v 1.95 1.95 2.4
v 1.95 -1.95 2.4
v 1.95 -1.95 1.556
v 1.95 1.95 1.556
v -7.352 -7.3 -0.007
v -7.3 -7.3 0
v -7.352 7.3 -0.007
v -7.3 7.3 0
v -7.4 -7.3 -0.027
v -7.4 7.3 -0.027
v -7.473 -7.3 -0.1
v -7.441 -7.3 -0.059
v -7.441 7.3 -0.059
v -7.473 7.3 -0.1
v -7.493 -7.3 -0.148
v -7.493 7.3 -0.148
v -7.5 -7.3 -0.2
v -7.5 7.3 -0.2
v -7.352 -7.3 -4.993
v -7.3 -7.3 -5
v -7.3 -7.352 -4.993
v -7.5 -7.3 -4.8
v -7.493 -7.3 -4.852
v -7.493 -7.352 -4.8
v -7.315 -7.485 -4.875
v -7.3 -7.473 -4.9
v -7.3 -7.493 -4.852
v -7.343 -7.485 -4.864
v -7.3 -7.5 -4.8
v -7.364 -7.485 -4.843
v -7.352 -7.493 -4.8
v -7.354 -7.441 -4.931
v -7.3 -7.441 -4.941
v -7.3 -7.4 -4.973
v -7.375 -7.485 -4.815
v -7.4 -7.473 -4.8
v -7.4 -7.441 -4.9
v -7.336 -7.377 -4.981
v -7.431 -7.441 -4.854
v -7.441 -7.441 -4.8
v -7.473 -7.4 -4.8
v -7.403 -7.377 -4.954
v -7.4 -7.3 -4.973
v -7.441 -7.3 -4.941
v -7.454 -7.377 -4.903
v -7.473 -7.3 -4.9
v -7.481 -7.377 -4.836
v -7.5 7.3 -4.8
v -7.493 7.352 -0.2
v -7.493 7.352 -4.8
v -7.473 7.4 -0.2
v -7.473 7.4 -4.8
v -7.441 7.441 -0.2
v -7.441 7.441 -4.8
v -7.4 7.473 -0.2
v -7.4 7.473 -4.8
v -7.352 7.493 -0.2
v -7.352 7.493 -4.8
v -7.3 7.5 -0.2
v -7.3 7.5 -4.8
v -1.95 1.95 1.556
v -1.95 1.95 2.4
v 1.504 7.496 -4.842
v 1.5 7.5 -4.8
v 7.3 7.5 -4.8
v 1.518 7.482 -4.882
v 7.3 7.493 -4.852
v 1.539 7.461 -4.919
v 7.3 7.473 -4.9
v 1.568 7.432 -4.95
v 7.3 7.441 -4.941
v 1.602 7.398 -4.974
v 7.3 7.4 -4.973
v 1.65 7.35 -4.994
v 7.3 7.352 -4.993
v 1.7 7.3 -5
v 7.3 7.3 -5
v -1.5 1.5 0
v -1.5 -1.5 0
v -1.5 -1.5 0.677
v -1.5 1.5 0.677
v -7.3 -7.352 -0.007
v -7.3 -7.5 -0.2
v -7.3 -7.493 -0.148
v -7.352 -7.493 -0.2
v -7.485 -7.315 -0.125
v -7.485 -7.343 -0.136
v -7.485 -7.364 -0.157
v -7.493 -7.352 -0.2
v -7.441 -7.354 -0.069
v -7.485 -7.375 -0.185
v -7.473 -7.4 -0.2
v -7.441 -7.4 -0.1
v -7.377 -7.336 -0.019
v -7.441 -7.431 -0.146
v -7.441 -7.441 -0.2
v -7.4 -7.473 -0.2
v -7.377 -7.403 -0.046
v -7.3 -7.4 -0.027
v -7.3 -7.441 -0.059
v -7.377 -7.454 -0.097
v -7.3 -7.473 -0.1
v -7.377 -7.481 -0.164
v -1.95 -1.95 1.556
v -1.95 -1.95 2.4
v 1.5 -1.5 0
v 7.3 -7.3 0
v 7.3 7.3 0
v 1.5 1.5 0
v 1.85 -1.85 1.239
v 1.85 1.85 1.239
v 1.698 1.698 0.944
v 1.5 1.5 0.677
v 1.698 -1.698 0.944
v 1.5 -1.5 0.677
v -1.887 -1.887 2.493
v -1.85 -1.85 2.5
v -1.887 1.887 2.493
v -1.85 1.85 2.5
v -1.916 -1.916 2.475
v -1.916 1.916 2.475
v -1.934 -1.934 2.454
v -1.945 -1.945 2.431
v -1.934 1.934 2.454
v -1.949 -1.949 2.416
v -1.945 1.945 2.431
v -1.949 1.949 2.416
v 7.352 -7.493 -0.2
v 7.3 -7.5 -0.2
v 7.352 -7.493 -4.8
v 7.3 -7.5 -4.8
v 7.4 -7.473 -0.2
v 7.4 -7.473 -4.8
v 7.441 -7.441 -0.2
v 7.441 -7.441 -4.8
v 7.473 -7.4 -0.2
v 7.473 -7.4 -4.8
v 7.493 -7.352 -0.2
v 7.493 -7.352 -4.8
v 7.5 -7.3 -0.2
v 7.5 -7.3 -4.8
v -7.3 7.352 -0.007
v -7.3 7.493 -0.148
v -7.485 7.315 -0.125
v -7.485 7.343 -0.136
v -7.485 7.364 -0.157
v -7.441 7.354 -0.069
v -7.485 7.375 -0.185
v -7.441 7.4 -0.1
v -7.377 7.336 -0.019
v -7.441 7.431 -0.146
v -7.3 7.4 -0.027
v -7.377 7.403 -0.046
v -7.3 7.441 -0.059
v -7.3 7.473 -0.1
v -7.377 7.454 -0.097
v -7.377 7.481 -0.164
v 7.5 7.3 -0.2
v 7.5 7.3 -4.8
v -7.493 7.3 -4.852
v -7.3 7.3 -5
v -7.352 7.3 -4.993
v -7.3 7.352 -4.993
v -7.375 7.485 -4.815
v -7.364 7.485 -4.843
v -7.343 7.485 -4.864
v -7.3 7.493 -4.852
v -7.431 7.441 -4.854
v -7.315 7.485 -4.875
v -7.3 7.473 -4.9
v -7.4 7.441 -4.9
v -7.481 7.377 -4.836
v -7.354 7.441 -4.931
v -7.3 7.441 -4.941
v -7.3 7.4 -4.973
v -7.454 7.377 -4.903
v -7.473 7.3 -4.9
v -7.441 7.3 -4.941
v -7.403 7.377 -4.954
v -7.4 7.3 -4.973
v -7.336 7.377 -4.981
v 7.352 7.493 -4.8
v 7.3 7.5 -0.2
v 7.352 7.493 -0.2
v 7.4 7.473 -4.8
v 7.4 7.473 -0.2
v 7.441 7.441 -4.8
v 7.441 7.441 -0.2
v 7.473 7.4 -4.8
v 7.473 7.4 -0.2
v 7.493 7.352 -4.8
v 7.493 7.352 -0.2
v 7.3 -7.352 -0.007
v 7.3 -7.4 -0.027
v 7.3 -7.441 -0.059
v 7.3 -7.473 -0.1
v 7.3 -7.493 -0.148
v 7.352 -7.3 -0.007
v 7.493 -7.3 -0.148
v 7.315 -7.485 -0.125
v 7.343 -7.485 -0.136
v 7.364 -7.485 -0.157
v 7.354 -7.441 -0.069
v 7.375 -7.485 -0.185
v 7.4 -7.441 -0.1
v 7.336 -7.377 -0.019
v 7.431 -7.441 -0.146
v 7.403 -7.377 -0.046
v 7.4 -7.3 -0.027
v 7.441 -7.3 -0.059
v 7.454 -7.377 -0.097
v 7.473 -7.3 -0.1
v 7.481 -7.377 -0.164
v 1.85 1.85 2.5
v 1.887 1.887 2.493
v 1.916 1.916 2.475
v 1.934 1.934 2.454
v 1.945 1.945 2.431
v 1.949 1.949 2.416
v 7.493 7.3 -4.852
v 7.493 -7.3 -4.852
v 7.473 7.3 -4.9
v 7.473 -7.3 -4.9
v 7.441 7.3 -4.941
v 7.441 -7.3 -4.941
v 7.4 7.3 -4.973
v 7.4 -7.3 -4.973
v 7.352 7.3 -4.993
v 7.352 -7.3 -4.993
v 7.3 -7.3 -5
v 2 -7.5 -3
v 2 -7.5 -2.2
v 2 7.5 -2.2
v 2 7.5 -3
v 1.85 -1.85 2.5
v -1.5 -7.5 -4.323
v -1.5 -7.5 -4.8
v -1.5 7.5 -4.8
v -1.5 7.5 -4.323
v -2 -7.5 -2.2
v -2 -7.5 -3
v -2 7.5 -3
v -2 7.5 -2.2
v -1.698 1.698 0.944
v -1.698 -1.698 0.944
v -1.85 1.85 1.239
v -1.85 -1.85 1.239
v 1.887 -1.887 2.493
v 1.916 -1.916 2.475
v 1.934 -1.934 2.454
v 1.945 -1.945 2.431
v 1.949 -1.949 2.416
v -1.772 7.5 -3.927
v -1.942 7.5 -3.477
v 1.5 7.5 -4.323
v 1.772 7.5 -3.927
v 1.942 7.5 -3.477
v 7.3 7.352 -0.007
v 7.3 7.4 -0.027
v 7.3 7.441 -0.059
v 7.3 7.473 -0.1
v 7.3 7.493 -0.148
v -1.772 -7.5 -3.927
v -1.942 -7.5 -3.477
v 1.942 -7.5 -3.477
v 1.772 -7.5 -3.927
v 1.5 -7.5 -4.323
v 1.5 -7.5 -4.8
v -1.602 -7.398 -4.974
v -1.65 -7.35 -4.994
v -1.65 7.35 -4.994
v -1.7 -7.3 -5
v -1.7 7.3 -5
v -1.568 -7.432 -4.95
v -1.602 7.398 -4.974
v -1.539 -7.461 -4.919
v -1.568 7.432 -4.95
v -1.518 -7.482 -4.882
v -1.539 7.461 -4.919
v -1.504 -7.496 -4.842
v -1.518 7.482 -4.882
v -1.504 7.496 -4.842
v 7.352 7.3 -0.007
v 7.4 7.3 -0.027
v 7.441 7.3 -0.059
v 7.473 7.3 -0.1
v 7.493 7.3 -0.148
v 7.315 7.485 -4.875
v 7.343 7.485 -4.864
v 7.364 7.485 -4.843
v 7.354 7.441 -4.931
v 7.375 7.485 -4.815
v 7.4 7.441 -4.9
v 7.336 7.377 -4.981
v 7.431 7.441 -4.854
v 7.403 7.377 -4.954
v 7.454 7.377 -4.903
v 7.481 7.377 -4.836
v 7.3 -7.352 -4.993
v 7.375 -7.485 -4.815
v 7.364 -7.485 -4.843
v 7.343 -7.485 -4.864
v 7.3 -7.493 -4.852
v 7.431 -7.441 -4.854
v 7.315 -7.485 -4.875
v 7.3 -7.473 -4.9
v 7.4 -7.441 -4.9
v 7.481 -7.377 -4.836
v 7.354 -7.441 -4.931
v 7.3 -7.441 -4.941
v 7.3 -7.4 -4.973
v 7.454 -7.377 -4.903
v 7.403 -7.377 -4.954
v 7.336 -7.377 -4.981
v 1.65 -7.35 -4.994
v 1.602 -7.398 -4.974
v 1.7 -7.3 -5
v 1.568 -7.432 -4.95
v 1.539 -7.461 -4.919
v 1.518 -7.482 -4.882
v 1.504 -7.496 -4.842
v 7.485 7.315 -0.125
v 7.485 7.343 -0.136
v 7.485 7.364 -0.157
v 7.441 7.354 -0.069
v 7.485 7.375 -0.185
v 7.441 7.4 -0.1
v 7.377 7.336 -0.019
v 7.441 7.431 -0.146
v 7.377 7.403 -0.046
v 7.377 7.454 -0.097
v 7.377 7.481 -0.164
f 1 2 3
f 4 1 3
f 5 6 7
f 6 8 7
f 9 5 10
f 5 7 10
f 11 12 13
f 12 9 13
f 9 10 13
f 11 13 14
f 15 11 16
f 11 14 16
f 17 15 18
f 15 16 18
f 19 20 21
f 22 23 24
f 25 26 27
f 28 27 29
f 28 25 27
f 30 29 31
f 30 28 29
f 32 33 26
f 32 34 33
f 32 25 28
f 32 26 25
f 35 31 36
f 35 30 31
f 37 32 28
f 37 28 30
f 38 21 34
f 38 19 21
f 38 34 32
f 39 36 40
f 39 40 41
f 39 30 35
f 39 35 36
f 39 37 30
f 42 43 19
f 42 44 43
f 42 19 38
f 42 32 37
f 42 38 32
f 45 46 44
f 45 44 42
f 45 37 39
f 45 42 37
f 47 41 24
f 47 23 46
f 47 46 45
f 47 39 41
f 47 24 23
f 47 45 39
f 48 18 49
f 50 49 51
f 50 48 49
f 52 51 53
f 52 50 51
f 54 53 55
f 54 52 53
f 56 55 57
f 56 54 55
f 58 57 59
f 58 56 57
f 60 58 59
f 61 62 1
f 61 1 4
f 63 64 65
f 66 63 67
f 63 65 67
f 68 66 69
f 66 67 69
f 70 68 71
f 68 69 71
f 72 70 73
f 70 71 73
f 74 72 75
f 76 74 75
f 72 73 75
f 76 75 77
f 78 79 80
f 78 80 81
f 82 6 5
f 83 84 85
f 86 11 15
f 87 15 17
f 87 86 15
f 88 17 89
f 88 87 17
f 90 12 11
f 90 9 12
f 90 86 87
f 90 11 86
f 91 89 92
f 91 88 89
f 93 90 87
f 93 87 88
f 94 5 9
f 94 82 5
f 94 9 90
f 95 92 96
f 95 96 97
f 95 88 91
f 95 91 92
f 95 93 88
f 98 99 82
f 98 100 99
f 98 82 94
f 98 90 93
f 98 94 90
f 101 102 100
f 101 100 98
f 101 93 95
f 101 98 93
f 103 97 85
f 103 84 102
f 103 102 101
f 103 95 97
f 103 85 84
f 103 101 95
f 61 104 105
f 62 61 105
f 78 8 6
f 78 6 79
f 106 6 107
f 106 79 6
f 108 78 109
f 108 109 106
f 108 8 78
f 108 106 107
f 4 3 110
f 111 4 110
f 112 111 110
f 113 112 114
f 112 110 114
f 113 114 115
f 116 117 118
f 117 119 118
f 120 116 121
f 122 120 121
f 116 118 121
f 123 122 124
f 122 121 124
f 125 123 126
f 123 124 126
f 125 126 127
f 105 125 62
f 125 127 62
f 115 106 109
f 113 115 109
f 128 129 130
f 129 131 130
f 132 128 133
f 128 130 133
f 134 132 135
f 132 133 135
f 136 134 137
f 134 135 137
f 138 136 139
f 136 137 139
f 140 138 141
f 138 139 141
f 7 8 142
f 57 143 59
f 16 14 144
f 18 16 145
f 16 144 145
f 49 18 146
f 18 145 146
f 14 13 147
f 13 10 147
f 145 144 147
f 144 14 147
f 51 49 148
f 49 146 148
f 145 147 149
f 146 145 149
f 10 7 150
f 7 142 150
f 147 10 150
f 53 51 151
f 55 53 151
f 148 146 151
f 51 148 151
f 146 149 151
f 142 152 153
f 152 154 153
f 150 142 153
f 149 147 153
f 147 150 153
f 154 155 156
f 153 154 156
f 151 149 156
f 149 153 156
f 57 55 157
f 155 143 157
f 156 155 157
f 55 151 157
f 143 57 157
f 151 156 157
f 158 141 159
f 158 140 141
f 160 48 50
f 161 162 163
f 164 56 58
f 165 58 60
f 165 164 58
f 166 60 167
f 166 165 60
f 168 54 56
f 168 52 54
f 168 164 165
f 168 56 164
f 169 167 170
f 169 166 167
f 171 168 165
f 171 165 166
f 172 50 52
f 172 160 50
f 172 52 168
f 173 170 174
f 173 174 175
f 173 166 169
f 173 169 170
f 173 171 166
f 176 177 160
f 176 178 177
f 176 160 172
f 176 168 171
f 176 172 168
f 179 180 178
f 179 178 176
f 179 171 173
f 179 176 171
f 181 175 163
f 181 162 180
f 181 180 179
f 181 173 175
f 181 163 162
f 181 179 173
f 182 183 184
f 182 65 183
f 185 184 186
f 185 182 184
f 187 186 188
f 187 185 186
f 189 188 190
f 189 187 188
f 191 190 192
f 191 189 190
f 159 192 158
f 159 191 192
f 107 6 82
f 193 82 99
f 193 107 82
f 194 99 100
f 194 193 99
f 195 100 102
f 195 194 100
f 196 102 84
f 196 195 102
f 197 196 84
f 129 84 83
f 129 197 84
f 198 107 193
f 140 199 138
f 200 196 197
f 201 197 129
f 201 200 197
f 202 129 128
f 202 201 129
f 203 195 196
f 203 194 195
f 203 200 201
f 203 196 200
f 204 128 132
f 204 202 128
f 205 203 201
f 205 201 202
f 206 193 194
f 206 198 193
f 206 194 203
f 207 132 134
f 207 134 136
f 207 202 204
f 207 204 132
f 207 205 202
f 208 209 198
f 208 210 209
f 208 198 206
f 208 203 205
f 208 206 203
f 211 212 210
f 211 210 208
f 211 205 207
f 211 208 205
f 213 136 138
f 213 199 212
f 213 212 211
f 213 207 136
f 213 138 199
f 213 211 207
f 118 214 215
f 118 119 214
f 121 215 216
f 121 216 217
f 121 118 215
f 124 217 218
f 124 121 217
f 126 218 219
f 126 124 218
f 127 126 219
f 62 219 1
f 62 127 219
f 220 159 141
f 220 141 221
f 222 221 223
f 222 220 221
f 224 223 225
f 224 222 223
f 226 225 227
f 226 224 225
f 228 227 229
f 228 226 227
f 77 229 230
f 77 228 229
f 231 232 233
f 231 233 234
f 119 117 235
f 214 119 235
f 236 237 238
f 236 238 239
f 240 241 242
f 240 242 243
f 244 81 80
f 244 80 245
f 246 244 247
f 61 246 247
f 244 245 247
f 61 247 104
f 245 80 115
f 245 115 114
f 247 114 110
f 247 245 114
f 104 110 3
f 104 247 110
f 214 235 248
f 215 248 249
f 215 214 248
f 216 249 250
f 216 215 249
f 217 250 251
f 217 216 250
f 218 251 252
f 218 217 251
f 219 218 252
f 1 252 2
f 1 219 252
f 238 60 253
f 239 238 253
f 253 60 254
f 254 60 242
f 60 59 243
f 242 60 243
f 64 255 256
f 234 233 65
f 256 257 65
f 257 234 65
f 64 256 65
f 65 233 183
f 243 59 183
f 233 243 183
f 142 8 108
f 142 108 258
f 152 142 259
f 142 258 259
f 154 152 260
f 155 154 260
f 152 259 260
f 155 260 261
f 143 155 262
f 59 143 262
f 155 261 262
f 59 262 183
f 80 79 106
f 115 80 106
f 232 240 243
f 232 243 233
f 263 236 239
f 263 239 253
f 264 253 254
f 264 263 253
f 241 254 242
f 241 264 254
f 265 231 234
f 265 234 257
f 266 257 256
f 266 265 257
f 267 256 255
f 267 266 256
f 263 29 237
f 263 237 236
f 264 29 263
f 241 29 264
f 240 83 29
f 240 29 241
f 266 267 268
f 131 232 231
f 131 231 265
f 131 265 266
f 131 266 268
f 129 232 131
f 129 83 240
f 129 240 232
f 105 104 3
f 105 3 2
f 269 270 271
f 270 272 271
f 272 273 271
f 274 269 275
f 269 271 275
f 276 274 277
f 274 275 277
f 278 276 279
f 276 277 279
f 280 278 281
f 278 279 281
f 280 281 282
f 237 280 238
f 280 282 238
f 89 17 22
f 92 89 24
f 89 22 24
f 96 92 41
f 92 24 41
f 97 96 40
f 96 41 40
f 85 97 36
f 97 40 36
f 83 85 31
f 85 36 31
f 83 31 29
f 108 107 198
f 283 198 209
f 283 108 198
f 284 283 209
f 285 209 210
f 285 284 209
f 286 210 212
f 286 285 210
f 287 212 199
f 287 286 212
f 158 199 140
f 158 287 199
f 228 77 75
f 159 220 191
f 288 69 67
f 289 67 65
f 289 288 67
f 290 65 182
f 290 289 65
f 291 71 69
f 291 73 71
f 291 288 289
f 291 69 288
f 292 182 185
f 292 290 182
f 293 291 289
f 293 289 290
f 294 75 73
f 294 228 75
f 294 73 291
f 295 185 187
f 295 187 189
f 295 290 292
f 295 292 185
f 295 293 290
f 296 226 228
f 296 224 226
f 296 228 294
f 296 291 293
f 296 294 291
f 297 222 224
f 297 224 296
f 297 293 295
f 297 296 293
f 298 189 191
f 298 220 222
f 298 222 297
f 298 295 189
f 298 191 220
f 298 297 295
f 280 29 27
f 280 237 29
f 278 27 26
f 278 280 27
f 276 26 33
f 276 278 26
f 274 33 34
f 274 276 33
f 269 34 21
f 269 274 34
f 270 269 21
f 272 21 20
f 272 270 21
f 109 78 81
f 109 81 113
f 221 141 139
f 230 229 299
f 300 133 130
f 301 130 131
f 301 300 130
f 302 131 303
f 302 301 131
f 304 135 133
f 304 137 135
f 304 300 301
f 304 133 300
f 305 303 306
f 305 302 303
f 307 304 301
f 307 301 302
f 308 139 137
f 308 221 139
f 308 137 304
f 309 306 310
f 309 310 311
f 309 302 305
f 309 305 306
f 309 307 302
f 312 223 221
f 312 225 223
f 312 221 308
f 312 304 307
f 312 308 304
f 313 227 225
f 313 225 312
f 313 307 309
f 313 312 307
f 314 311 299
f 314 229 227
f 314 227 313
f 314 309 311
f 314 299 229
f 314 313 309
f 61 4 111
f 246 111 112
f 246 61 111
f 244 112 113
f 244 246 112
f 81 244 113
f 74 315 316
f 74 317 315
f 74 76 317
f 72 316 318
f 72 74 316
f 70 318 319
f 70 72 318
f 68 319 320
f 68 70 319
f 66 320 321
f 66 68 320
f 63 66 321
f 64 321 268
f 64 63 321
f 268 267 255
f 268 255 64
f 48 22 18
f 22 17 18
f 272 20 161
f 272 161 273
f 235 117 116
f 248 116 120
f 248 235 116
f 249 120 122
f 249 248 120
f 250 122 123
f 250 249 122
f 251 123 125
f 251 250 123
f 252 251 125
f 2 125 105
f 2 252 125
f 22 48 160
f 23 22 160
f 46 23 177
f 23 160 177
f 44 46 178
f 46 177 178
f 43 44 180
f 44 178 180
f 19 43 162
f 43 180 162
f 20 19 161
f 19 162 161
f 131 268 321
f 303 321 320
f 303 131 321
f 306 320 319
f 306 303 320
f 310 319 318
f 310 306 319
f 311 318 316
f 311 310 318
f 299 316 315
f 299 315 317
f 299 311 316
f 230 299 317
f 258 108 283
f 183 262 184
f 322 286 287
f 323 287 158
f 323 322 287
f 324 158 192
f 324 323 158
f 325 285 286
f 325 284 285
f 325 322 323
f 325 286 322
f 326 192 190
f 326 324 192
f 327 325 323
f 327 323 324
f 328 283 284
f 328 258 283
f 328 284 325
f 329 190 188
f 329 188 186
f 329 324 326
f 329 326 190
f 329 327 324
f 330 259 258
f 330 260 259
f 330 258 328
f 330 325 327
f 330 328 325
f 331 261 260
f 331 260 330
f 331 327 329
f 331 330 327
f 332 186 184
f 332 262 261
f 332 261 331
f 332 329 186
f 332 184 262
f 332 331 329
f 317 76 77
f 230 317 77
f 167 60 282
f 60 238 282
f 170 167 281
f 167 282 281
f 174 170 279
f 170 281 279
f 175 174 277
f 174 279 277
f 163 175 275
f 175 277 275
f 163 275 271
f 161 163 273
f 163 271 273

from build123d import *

# Parameters (mm, degrees)
SKETCH_1_W                      = 15
SKETCH_1_H                      = 15
EXTRUDE_1_DEPTH                 = 5
SKETCH_2_W                      = 3
SKETCH_2_H                      = 3
EXTRUDE_2_DEPTH                 = 1
EXTRUDE_3_DEPTH                 = 2
EXTRUDE_3_DEPTH_BACK            = 2
CUT_EXTRUDE_1_REACH             = 13.726
CUT_EXTRUDE_1_DIRECTION_2_REACH = 13.726
CUT_EXTRUDE_2_REACH             = 19.5
FILLET_1_R                      = 0.1
FILLET_2_R                      = 0.2


with BuildPart() as part:
    # 草图1 → 凸台-拉伸1 (new body)
    with BuildSketch(Plane.XY):
        Rectangle(SKETCH_1_W, SKETCH_1_H)
    extrude(amount=-EXTRUDE_1_DEPTH)

    # 草图2 → 凸台-拉伸2 (add)
    with BuildSketch(Plane.XY):
        Rectangle(SKETCH_2_W, SKETCH_2_H)
    extrude(amount=EXTRUDE_2_DEPTH)

    # 草图3 → 凸台-拉伸3 (add, two sides: drawn at the far end of the back side and taken through both)
    with BuildSketch(Plane(origin=(0, 0, 0), x_dir=(1, 0, 0), z_dir=(0, 1, 0)).offset(-EXTRUDE_3_DEPTH_BACK)):
        with BuildLine():
            Line((-1.95, -2.5), (1.95, -2.5))
            Line((1.95, -2.5), (1.95, -1.555590279))
            ThreePointArc((1.95, -1.555590279), (1.780042303, -1.088161527), (1.5, -0.677124344))
            Line((1.5, -0.677124344), (-1.5, -0.677124344))
            ThreePointArc((-1.5, -0.677124344), (-1.780042303, -1.088161527), (-1.95, -1.555590279))
            Line((-1.95, -1.555590279), (-1.95, -2.5))
        make_face()
    extrude(amount=EXTRUDE_3_DEPTH + EXTRUDE_3_DEPTH_BACK)

    # 草图4 → 切除-拉伸1 (cut, up to next)
    with BuildSketch(Plane(origin=(0, 0, 0), x_dir=(0, 0, -1), z_dir=(1, 0, 0)), mode=Mode.PRIVATE) as cut_extrude_1_sk1:
        with BuildLine():
            Line((-2.5, 1.95), (-1.555590279, 1.95))
            ThreePointArc((-1.555590279, 1.95), (-1.088161527, 1.780042303), (-0.677124344, 1.5))
            Line((-0.677124344, 1.5), (-0.677124344, 2))
            Line((-0.677124344, 2), (-2.5, 2))
            Line((-2.5, 2), (-2.5, 1.95))
        make_face()
    cut_extrude_1_tool1 = extrude(cut_extrude_1_sk1.sketch, amount=-CUT_EXTRUDE_1_REACH, mode=Mode.PRIVATE) & part.part
    # 草图4 → 切除-拉伸1 (cut, up to next)
    with BuildSketch(Plane(origin=(0, 0, 0), x_dir=(0, 0, -1), z_dir=(1, 0, 0)), mode=Mode.PRIVATE) as cut_extrude_1_sk2:
        with BuildLine():
            Line((-2.5, -2), (-0.677124344, -2))
            Line((-0.677124344, -2), (-0.677124344, -1.5))
            ThreePointArc((-0.677124344, -1.5), (-1.088161527, -1.780042303), (-1.555590279, -1.95))
            Line((-1.555590279, -1.95), (-2.5, -1.95))
            Line((-2.5, -1.95), (-2.5, -2))
        make_face()
    cut_extrude_1_tool2 = extrude(cut_extrude_1_sk2.sketch, amount=-CUT_EXTRUDE_1_REACH, mode=Mode.PRIVATE) & part.part
    add(cut_extrude_1_tool1.solids().sort_by_distance((0, 1.873038, 1.175075))[0], mode=Mode.SUBTRACT)
    add(cut_extrude_1_tool2.solids().sort_by_distance((0, -1.873038, 1.175075))[0], mode=Mode.SUBTRACT)

    # 草图4 → 切除-拉伸1 direction 2 (cut, up to next)
    with BuildSketch(Plane(origin=(0, 0, 0), x_dir=(0, 0, -1), z_dir=(1, 0, 0)), mode=Mode.PRIVATE) as cut_extrude_1_direction_2_sk1:
        with BuildLine():
            Line((-2.5, 1.95), (-1.555590279, 1.95))
            ThreePointArc((-1.555590279, 1.95), (-1.088161527, 1.780042303), (-0.677124344, 1.5))
            Line((-0.677124344, 1.5), (-0.677124344, 2))
            Line((-0.677124344, 2), (-2.5, 2))
            Line((-2.5, 2), (-2.5, 1.95))
        make_face()
    cut_extrude_1_direction_2_tool1 = extrude(cut_extrude_1_direction_2_sk1.sketch, amount=CUT_EXTRUDE_1_DIRECTION_2_REACH, mode=Mode.PRIVATE) & part.part
    # 草图4 → 切除-拉伸1 direction 2 (cut, up to next)
    with BuildSketch(Plane(origin=(0, 0, 0), x_dir=(0, 0, -1), z_dir=(1, 0, 0)), mode=Mode.PRIVATE) as cut_extrude_1_direction_2_sk2:
        with BuildLine():
            Line((-2.5, -2), (-0.677124344, -2))
            Line((-0.677124344, -2), (-0.677124344, -1.5))
            ThreePointArc((-0.677124344, -1.5), (-1.088161527, -1.780042303), (-1.555590279, -1.95))
            Line((-1.555590279, -1.95), (-2.5, -1.95))
            Line((-2.5, -1.95), (-2.5, -2))
        make_face()
    cut_extrude_1_direction_2_tool2 = extrude(cut_extrude_1_direction_2_sk2.sketch, amount=CUT_EXTRUDE_1_DIRECTION_2_REACH, mode=Mode.PRIVATE) & part.part
    add(cut_extrude_1_direction_2_tool1.solids().sort_by_distance((0, 1.873038, 1.175075))[0], mode=Mode.SUBTRACT)
    add(cut_extrude_1_direction_2_tool2.solids().sort_by_distance((0, -1.873038, 1.175075))[0], mode=Mode.SUBTRACT)

    # 草图5 → 切除-拉伸2 (cut, up to next)
    with BuildSketch(Plane.XZ.offset(7.5), mode=Mode.PRIVATE) as cut_extrude_2_sk1:
        with BuildLine():
            Line((-1.5, -5), (-1.5, -4.322875656))
            ThreePointArc((-1.5, -4.322875656), (-1.870828693, -3.707106781), (-2, -3))
            Line((-2, -3), (-2, -2.2))
            Line((-2, -2.2), (2, -2.2))
            Line((2, -2.2), (2, -3))
            ThreePointArc((2, -3), (1.870828693, -3.707106781), (1.5, -4.322875656))
            Line((1.5, -4.322875656), (1.5, -5))
            Line((1.5, -5), (-1.5, -5))
        make_face()
    cut_extrude_2_tool1 = extrude(cut_extrude_2_sk1.sketch, amount=-CUT_EXTRUDE_2_REACH, mode=Mode.PRIVATE) & part.part
    add(cut_extrude_2_tool1.solids().sort_by_distance((0, -7.5, -3.51237))[0], mode=Mode.SUBTRACT)

    # 圆角1
    fillet_1_edges = [part.edges().sort_by_distance(p)[0] for p in [
        (-1.95, 0, 2.5),
        (1.95, 0, 2.5),
        (0, -1.95, 2.5),
        (0, 1.95, 2.5),
    ]]
    fillet(fillet_1_edges, radius=FILLET_1_R)

    # 圆角2
    fillet_2_edges = [part.edges().sort_by_distance(p)[0] for p in [
        (7.5, 0, -5),
        (4.5, 7.5, -5),
        (-7.5, 0, -5),
        (0, 7.5, 0),
        (7.5, 0, 0),
        (0, -7.5, 0),
        (-7.5, 0, 0),
        (-4.5, -7.5, -5),
        (-7.5, 7.5, -2.5),
        (7.5, 7.5, -2.5),
        (7.5, -7.5, -2.5),
        (-7.5, -7.5, -2.5),
        (-4.5, 7.5, -5),
        (4.5, -7.5, -5),
        (1.5, 0, -5),
        (-1.5, 0, -5),
    ]]
    fillet(fillet_2_edges, radius=FILLET_2_R)


solid = part.part
